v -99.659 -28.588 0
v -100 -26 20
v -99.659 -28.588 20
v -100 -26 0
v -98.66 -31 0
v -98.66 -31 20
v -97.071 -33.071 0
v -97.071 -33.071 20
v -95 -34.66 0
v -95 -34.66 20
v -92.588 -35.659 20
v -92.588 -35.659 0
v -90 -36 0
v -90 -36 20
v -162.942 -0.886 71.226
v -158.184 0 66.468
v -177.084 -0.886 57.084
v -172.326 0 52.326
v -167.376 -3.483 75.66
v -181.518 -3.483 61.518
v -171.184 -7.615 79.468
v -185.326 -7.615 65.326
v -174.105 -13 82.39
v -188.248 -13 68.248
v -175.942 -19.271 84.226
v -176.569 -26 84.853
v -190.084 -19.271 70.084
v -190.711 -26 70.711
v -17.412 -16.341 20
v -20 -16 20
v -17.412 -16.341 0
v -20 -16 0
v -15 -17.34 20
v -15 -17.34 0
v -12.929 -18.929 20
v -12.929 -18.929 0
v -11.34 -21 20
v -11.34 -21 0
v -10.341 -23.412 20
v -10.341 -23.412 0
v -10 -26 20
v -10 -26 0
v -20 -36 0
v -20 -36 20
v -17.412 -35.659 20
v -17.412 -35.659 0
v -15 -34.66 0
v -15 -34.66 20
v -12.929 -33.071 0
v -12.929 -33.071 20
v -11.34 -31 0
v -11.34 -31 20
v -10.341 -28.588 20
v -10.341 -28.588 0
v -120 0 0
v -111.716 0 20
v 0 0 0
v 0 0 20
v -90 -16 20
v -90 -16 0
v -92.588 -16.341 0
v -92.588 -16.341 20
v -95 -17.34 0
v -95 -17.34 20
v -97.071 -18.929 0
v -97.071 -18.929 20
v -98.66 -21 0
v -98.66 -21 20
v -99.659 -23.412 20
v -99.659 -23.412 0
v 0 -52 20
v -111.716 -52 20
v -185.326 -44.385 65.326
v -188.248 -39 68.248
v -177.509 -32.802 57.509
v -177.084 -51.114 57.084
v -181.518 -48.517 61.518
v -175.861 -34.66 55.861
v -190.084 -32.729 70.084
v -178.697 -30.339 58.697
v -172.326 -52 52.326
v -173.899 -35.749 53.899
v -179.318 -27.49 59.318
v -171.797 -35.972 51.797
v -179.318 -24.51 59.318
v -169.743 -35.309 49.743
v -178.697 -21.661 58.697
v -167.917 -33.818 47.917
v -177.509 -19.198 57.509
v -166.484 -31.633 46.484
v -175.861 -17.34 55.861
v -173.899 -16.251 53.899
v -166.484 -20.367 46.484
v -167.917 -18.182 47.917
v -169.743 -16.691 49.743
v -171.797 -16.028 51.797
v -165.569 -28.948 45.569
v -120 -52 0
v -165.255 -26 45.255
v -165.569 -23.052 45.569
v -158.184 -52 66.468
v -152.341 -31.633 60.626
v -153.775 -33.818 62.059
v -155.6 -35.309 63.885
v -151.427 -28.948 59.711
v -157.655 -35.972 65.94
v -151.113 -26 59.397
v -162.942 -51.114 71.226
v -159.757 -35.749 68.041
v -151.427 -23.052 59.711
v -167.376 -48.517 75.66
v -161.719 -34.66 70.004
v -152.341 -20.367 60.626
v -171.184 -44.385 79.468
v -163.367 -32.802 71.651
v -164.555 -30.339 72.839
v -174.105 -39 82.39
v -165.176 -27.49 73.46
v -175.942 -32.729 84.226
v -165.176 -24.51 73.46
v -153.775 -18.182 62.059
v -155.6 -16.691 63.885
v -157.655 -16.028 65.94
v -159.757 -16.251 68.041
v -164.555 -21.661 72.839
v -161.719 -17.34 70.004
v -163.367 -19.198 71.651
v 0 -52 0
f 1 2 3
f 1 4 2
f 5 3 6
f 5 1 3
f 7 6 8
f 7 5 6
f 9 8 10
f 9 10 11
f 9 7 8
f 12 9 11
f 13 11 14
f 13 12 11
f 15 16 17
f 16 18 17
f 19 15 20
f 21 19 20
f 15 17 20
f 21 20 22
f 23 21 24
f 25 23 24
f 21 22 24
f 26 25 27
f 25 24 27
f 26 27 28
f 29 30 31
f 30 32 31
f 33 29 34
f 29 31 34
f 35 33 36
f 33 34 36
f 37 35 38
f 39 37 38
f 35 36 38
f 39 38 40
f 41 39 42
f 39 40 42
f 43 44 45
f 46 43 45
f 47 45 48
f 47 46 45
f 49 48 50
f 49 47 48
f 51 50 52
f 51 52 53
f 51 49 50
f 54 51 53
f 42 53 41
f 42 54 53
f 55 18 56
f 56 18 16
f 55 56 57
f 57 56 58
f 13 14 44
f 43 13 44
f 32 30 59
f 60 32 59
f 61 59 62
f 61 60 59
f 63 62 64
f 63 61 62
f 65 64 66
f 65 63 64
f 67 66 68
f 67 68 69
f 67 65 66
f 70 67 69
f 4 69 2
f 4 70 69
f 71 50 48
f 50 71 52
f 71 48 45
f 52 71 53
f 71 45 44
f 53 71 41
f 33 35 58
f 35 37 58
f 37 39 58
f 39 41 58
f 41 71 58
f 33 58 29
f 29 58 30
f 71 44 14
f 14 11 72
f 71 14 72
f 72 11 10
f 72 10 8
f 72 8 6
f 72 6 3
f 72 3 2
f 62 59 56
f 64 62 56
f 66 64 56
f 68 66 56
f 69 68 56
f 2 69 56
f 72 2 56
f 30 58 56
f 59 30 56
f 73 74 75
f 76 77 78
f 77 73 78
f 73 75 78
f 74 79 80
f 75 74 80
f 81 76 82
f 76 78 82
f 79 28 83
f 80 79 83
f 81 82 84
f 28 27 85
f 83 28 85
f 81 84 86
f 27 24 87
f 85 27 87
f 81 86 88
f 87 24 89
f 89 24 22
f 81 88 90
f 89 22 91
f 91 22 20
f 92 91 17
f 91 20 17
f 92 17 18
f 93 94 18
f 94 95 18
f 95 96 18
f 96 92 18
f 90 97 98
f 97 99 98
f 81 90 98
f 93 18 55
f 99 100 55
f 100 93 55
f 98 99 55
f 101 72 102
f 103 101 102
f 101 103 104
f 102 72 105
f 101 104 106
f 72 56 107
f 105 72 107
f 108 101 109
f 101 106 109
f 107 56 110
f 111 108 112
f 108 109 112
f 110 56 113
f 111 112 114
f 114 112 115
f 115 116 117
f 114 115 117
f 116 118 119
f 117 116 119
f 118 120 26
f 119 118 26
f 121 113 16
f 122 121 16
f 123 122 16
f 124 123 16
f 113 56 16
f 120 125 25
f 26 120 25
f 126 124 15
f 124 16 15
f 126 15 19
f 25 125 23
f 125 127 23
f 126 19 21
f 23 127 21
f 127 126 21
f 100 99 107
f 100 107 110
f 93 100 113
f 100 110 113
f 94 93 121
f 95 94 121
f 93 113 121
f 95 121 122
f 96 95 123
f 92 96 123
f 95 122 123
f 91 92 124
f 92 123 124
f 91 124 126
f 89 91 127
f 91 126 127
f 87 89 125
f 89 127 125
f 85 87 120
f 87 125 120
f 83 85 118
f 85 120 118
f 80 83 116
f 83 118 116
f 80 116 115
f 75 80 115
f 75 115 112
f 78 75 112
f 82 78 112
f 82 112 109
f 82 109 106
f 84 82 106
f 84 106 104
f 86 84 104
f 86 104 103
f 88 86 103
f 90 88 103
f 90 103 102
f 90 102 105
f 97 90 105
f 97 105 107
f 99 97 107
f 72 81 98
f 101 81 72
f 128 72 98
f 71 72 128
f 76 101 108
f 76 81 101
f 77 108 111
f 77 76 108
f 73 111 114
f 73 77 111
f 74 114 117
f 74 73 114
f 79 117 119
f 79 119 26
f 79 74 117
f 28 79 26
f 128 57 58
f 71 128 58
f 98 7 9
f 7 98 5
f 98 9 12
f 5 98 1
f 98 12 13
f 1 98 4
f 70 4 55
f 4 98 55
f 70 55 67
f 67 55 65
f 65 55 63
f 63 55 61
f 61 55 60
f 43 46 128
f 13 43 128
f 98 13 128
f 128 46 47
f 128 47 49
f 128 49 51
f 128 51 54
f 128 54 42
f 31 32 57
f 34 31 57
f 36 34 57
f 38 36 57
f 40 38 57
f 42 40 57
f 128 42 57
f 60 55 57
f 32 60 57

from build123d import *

# Parameters (mm, degrees)
F1_DEPTH = 52
F2_R     = 10
F3_DEPTH = 25
F4_R     = 25.99999
F6_DEPTH = 25
F7_R     = 9.99999


# Not quite as in the source:
# - a fillet or chamfer is up to 0.001 mm smaller than in the source, because OpenCascade refuses the exact size
# - a feature names something its author has since deleted; it is built from what else it names


with BuildPart() as f1:
    # F0 (on Front) → F1 (new body)
    with BuildSketch(Plane.XZ):
        Polygon((-120, 0), (0, 0), (0, 20), (-111.7157287525, 20), (-176.5685424949, 84.8528137424), (-190.7106781187, 70.7106781187), align=None)
    extrude(amount=F1_DEPTH)

    # F2 (on face) → F3 (cut)
    with BuildSketch(Plane(origin=(-45.8578643763, 0, -45.8578643763), x_dir=(0.7071067812, 0, -0.7071067812), z_dir=(0.7071067812, 0, 0.7071067812))):
        with Locations((-158.8528137424, -26)):
            Circle(F2_R)
    extrude(amount=-F3_DEPTH, mode=Mode.SUBTRACT)

    # F4 (radius 26 in the source; OpenCascade refuses exactly that, so slightly less here)
    f4_edges = [f1.edges().sort_by_distance(p)[0] for p in [
        (-183.63961, 0, 77.781746),
        (-183.63961, -52, 77.781746),
    ]]
    fillet(f4_edges, radius=F4_R)

    # F5 (on face) → F6 (cut)
    with BuildSketch(Plane.XY.offset(20)):
        Polygon((-10, -16), (-100, -16), (-100, -26), (-100, -36), (-10, -36), (-10, -26), align=None)
    extrude(amount=-F6_DEPTH, mode=Mode.SUBTRACT)

    # F7 (radius 10 in the source; OpenCascade refuses exactly that, so slightly less here)
    f7_edges = [f1.edges().sort_by_distance(p)[0] for p in [
        (-10, -16, 10),
        (-10, -36, 10),
        (-100, -16, 10),
        (-100, -36, 10),
    ]]
    fillet(f7_edges, radius=F7_R)


solid = f1.part
